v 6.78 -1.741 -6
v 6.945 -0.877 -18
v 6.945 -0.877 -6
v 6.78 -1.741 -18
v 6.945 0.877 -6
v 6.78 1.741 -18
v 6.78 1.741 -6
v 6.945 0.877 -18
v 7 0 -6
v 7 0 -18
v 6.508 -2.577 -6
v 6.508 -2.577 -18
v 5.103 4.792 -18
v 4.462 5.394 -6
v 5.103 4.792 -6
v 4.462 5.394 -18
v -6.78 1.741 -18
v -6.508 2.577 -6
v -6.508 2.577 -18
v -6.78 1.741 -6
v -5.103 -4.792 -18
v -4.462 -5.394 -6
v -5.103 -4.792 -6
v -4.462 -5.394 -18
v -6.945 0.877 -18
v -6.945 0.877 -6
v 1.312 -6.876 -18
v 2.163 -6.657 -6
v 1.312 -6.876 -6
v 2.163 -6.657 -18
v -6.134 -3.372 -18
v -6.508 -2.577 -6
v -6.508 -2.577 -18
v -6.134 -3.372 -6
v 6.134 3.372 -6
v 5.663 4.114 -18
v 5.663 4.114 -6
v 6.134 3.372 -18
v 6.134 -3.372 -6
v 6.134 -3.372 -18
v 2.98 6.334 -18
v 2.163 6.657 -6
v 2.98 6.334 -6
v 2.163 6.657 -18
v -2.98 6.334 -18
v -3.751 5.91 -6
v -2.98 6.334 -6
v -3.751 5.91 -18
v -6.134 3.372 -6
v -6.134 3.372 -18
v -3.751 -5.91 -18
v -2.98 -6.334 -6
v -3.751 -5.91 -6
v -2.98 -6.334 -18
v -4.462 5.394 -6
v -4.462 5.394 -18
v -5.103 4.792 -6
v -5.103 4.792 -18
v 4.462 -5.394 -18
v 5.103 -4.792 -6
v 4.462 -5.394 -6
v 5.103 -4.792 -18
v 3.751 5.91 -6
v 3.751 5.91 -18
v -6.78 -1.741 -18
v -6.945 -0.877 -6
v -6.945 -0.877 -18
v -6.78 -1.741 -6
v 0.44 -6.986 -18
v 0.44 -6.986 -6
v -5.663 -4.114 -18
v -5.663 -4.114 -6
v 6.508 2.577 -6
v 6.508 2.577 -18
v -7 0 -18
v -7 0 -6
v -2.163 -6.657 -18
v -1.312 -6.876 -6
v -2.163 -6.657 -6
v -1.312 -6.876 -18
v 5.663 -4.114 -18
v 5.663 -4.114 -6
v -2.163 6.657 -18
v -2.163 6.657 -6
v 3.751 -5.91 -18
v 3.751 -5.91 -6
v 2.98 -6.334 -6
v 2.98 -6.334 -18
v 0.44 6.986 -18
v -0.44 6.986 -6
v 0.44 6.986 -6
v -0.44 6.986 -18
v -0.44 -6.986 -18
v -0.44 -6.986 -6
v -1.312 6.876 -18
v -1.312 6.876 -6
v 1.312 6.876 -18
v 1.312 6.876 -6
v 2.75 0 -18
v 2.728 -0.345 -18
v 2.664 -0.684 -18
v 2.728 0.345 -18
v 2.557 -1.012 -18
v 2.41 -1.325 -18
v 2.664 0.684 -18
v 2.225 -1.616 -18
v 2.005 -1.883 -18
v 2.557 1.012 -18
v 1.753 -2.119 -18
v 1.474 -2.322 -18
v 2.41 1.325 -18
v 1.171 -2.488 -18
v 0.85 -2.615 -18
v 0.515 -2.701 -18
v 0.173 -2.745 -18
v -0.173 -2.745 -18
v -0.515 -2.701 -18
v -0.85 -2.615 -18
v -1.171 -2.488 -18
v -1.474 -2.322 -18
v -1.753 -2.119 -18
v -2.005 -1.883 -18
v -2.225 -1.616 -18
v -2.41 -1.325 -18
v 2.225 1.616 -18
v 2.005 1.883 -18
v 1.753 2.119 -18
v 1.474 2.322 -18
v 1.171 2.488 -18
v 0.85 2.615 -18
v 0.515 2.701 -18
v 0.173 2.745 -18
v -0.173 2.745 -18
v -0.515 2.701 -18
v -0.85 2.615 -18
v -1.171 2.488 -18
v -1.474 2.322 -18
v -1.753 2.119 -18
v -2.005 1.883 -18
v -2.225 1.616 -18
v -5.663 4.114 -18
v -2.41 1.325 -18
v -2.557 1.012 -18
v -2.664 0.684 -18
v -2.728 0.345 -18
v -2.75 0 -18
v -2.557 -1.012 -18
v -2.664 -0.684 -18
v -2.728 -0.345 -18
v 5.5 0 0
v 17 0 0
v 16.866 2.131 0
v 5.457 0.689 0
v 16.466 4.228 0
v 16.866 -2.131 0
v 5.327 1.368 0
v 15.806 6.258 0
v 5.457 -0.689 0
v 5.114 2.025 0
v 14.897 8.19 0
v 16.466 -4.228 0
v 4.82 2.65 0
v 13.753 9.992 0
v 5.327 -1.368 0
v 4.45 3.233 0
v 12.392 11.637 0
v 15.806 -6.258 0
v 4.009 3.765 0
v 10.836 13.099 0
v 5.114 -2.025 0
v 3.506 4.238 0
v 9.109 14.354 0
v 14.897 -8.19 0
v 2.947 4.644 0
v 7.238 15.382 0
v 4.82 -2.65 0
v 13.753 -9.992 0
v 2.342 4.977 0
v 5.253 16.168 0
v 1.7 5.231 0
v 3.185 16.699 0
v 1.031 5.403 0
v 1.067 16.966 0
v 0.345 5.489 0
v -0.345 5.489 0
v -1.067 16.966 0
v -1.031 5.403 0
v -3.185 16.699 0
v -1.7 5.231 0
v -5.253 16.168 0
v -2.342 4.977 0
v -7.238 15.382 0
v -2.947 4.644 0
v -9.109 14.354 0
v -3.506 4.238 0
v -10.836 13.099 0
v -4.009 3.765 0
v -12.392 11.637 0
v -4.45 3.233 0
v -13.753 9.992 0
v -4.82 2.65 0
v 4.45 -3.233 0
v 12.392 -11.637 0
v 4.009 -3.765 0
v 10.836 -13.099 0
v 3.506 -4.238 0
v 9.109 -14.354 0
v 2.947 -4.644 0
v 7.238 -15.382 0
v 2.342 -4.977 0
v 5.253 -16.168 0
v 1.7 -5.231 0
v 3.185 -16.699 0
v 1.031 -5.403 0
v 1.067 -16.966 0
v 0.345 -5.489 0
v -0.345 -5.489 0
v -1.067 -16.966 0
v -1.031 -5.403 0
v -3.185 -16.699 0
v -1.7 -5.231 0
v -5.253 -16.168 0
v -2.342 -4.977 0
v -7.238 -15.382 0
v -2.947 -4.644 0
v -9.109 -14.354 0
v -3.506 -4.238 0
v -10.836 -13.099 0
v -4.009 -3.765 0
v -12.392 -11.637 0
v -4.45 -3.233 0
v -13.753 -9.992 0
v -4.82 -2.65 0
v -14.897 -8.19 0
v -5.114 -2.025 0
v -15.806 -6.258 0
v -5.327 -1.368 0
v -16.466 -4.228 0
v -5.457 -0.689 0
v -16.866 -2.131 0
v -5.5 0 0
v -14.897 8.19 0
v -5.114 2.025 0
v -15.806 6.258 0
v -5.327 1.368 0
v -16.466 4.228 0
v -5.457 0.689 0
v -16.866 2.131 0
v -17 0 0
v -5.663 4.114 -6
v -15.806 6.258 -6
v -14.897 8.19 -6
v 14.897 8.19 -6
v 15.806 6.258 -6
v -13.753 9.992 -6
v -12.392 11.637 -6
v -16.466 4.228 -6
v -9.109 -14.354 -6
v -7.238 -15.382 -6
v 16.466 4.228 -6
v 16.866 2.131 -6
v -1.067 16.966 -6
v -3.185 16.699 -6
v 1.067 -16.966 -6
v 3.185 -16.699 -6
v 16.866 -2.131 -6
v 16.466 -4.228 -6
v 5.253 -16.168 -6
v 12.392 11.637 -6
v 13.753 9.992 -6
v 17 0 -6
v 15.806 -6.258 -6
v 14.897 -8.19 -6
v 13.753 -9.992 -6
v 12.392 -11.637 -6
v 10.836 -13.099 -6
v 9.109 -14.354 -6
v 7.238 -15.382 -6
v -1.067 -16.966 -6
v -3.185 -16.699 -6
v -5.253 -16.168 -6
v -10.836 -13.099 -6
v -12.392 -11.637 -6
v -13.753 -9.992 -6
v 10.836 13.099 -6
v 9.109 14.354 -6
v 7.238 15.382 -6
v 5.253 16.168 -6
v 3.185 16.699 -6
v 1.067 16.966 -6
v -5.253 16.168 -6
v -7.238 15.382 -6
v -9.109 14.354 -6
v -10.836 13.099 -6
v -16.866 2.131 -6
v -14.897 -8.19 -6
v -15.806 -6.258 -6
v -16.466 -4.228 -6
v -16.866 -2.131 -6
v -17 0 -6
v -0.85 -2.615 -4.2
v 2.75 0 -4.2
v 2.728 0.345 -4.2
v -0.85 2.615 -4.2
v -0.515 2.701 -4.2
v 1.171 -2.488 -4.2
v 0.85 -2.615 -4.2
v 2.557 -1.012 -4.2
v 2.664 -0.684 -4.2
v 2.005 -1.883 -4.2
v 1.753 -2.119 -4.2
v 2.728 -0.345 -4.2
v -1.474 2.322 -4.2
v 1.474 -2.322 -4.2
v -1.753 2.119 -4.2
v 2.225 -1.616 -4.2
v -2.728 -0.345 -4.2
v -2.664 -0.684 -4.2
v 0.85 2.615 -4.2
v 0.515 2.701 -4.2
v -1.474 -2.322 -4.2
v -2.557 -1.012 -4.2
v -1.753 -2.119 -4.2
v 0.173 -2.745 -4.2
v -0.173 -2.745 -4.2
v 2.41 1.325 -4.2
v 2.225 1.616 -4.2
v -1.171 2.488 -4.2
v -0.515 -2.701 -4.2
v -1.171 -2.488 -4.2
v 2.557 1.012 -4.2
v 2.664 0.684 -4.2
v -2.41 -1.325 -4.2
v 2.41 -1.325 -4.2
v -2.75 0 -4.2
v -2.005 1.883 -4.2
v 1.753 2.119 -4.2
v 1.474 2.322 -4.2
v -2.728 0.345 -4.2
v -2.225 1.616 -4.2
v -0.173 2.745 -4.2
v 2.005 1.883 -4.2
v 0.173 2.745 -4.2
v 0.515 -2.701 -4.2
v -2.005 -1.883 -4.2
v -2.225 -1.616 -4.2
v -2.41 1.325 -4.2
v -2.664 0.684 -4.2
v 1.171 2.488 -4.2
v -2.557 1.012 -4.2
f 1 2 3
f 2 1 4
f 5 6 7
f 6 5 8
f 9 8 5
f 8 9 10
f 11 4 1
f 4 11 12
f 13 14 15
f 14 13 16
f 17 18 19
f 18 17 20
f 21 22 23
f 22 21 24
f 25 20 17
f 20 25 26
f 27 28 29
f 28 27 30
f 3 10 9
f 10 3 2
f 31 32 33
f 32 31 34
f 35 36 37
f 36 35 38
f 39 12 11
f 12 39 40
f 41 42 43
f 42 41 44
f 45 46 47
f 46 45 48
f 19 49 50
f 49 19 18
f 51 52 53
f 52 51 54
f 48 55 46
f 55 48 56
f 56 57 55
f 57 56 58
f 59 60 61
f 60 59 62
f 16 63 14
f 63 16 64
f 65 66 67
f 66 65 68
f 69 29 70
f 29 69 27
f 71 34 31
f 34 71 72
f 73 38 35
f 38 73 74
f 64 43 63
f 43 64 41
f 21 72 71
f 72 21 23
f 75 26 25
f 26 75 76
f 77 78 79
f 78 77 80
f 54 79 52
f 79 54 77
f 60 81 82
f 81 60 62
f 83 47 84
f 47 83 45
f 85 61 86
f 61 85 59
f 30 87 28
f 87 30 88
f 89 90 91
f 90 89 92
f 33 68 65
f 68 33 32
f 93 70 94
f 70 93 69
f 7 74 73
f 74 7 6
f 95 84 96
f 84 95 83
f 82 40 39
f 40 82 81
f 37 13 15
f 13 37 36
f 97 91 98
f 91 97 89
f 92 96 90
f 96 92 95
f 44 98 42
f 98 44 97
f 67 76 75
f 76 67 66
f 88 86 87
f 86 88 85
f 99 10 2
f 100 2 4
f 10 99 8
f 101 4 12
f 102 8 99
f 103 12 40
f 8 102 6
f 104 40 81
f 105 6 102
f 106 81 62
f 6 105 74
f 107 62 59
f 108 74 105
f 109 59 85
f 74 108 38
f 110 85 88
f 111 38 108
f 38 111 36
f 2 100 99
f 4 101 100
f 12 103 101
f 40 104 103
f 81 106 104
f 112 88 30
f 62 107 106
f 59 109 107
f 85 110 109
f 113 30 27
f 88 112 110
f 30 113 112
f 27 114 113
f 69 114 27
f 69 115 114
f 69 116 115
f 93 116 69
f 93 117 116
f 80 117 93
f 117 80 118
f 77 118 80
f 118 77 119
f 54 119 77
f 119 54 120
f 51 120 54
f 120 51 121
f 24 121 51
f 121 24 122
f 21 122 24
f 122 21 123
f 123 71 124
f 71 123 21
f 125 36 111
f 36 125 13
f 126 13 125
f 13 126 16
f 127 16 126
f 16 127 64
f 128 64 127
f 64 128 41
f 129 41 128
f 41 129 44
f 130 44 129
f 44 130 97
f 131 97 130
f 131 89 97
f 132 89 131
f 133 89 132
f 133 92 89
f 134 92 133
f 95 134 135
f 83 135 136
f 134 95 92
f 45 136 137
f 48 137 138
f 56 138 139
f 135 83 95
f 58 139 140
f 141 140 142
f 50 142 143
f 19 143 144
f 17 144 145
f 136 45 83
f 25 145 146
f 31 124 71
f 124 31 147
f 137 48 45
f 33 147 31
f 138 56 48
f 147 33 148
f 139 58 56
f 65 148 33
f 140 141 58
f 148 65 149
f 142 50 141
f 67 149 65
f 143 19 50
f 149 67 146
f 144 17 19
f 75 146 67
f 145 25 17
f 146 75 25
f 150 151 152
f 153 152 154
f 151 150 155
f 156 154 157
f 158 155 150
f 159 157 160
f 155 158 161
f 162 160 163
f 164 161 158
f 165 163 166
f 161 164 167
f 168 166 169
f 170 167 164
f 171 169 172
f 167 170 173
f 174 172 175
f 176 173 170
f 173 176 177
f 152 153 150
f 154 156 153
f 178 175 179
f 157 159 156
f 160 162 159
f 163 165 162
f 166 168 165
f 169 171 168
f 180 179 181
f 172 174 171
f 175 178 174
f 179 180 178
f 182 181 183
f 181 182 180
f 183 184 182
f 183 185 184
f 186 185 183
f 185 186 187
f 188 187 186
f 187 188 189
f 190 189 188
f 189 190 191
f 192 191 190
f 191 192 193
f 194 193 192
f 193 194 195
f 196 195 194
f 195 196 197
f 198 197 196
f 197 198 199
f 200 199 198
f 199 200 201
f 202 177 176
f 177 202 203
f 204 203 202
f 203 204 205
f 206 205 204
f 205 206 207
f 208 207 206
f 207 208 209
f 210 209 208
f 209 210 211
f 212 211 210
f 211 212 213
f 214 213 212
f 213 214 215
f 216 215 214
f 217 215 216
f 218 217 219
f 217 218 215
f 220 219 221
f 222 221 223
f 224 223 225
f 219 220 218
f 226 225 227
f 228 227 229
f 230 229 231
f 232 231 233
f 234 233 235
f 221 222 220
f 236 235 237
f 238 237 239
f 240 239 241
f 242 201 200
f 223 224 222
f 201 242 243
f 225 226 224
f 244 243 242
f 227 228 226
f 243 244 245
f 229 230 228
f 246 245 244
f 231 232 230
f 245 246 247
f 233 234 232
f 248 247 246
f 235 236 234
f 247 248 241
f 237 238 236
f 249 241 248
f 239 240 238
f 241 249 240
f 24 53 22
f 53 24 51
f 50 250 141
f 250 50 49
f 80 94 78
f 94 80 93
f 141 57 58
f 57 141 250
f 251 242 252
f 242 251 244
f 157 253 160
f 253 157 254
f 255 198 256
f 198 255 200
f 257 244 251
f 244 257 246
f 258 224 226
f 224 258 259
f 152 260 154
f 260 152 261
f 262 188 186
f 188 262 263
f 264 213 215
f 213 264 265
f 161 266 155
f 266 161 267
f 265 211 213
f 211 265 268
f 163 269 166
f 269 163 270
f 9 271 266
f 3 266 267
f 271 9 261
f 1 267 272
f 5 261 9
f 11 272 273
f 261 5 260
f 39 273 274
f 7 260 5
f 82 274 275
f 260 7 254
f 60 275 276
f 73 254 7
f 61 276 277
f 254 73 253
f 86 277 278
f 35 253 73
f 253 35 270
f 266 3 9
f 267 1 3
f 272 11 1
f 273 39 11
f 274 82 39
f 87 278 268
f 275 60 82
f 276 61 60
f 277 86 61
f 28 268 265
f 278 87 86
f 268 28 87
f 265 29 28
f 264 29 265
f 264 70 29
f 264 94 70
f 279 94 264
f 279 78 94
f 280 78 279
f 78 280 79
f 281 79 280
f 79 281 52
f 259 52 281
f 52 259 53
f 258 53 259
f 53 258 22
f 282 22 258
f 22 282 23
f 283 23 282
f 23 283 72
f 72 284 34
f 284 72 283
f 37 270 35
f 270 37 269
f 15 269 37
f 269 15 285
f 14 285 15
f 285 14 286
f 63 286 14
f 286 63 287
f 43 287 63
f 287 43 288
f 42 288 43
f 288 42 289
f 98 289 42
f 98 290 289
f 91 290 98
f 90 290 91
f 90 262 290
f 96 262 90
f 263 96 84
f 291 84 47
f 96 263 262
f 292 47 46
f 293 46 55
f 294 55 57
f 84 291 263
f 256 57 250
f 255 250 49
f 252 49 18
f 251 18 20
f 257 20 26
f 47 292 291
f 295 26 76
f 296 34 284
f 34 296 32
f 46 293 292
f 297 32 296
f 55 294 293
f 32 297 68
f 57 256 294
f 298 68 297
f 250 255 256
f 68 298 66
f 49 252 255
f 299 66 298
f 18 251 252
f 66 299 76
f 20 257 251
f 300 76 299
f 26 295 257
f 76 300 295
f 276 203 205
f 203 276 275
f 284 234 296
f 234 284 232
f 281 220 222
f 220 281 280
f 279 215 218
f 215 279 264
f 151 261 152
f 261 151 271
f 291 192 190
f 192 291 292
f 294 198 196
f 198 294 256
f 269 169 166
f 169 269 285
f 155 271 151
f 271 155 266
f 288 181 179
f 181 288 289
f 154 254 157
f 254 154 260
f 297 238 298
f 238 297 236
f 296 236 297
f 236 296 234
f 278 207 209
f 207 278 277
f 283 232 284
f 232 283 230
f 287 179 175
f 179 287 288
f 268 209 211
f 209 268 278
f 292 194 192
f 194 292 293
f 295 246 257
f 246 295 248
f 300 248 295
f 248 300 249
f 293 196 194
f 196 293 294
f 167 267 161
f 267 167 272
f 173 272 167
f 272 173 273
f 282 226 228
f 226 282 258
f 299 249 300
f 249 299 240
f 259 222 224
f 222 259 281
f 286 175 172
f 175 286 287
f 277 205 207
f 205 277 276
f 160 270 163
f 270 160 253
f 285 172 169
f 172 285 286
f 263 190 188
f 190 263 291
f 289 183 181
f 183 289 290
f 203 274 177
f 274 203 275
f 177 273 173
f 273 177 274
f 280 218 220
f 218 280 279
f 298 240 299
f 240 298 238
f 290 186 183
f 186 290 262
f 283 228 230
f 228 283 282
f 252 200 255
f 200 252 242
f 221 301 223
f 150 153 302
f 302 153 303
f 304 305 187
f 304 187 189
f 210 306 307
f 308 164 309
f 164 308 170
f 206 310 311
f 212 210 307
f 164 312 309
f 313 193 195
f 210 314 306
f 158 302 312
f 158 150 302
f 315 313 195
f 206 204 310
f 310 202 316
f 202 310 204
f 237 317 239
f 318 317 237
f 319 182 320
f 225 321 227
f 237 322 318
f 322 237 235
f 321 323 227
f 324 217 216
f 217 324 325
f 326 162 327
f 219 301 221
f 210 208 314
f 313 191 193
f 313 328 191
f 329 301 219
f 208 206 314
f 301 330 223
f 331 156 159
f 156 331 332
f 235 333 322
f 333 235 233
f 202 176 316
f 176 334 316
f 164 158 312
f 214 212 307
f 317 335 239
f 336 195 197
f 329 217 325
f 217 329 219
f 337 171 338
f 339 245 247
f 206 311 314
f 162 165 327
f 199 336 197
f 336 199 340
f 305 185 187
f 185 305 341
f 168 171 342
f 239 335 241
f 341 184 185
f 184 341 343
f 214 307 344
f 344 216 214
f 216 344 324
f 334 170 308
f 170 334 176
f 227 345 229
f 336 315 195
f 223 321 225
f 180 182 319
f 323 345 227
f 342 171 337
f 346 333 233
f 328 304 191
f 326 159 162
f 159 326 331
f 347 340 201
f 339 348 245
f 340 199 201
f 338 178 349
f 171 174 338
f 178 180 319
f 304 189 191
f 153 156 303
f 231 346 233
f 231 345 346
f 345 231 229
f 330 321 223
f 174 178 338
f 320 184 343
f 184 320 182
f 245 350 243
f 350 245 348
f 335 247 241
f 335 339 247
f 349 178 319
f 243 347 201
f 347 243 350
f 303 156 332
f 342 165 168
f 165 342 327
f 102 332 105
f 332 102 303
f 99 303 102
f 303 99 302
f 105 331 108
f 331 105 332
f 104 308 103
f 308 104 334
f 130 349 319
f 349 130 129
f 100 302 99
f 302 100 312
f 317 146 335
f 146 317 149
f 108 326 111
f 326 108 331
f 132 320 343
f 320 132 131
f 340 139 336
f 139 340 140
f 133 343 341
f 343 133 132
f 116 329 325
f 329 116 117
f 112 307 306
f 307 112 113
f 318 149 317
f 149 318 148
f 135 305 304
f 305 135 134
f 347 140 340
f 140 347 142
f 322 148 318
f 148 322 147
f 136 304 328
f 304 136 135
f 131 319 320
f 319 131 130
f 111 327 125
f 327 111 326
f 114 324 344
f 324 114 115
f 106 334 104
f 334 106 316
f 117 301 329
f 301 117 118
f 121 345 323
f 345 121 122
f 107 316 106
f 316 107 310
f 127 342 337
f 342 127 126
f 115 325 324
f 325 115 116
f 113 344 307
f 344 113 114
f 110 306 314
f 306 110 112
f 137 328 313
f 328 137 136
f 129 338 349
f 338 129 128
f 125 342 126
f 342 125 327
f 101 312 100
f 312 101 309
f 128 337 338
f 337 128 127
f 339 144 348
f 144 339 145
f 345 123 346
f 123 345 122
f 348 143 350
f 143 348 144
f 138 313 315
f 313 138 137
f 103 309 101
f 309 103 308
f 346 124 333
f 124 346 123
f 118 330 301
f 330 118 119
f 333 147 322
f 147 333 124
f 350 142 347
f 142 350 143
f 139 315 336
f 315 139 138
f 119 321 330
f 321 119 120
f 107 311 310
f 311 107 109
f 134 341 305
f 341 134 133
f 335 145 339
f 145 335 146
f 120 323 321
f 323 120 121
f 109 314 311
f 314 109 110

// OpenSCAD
$fn = 50;


difference() {
	union() {
		translate(v = [0, 0, -18.0000000000]) {
			cylinder(h = 18, r = 7.0000000000);
		}
		translate(v = [0, 0, -6.0000000000]) {
			cylinder(h = 6, r = 17.0000000000);
		}
	}
	union() {
		translate(v = [0, 0, 0]) {
			rotate(a = [0, 0, 0]) {
				difference() {
					union() {
						#translate(v = [0, 0, -18.0000000000]) {
							cylinder(h = 18, r = 2.2500000000);
						}
						#translate(v = [0, 0, -4.2000000000]) {
							cylinder(h = 4.2000000000, r = 7.0000000000, r1 = 2.7500000000, r2 = 5.5000000000);
						}
						#translate(v = [0, 0, -18.0000000000]) {
							cylinder(h = 18, r = 2.7500000000);
						}
						#translate(v = [0, 0, -18.0000000000]) {
							cylinder(h = 18, r = 2.2500000000);
						}
					}
					union();
				}
			}
		}
	}
}
